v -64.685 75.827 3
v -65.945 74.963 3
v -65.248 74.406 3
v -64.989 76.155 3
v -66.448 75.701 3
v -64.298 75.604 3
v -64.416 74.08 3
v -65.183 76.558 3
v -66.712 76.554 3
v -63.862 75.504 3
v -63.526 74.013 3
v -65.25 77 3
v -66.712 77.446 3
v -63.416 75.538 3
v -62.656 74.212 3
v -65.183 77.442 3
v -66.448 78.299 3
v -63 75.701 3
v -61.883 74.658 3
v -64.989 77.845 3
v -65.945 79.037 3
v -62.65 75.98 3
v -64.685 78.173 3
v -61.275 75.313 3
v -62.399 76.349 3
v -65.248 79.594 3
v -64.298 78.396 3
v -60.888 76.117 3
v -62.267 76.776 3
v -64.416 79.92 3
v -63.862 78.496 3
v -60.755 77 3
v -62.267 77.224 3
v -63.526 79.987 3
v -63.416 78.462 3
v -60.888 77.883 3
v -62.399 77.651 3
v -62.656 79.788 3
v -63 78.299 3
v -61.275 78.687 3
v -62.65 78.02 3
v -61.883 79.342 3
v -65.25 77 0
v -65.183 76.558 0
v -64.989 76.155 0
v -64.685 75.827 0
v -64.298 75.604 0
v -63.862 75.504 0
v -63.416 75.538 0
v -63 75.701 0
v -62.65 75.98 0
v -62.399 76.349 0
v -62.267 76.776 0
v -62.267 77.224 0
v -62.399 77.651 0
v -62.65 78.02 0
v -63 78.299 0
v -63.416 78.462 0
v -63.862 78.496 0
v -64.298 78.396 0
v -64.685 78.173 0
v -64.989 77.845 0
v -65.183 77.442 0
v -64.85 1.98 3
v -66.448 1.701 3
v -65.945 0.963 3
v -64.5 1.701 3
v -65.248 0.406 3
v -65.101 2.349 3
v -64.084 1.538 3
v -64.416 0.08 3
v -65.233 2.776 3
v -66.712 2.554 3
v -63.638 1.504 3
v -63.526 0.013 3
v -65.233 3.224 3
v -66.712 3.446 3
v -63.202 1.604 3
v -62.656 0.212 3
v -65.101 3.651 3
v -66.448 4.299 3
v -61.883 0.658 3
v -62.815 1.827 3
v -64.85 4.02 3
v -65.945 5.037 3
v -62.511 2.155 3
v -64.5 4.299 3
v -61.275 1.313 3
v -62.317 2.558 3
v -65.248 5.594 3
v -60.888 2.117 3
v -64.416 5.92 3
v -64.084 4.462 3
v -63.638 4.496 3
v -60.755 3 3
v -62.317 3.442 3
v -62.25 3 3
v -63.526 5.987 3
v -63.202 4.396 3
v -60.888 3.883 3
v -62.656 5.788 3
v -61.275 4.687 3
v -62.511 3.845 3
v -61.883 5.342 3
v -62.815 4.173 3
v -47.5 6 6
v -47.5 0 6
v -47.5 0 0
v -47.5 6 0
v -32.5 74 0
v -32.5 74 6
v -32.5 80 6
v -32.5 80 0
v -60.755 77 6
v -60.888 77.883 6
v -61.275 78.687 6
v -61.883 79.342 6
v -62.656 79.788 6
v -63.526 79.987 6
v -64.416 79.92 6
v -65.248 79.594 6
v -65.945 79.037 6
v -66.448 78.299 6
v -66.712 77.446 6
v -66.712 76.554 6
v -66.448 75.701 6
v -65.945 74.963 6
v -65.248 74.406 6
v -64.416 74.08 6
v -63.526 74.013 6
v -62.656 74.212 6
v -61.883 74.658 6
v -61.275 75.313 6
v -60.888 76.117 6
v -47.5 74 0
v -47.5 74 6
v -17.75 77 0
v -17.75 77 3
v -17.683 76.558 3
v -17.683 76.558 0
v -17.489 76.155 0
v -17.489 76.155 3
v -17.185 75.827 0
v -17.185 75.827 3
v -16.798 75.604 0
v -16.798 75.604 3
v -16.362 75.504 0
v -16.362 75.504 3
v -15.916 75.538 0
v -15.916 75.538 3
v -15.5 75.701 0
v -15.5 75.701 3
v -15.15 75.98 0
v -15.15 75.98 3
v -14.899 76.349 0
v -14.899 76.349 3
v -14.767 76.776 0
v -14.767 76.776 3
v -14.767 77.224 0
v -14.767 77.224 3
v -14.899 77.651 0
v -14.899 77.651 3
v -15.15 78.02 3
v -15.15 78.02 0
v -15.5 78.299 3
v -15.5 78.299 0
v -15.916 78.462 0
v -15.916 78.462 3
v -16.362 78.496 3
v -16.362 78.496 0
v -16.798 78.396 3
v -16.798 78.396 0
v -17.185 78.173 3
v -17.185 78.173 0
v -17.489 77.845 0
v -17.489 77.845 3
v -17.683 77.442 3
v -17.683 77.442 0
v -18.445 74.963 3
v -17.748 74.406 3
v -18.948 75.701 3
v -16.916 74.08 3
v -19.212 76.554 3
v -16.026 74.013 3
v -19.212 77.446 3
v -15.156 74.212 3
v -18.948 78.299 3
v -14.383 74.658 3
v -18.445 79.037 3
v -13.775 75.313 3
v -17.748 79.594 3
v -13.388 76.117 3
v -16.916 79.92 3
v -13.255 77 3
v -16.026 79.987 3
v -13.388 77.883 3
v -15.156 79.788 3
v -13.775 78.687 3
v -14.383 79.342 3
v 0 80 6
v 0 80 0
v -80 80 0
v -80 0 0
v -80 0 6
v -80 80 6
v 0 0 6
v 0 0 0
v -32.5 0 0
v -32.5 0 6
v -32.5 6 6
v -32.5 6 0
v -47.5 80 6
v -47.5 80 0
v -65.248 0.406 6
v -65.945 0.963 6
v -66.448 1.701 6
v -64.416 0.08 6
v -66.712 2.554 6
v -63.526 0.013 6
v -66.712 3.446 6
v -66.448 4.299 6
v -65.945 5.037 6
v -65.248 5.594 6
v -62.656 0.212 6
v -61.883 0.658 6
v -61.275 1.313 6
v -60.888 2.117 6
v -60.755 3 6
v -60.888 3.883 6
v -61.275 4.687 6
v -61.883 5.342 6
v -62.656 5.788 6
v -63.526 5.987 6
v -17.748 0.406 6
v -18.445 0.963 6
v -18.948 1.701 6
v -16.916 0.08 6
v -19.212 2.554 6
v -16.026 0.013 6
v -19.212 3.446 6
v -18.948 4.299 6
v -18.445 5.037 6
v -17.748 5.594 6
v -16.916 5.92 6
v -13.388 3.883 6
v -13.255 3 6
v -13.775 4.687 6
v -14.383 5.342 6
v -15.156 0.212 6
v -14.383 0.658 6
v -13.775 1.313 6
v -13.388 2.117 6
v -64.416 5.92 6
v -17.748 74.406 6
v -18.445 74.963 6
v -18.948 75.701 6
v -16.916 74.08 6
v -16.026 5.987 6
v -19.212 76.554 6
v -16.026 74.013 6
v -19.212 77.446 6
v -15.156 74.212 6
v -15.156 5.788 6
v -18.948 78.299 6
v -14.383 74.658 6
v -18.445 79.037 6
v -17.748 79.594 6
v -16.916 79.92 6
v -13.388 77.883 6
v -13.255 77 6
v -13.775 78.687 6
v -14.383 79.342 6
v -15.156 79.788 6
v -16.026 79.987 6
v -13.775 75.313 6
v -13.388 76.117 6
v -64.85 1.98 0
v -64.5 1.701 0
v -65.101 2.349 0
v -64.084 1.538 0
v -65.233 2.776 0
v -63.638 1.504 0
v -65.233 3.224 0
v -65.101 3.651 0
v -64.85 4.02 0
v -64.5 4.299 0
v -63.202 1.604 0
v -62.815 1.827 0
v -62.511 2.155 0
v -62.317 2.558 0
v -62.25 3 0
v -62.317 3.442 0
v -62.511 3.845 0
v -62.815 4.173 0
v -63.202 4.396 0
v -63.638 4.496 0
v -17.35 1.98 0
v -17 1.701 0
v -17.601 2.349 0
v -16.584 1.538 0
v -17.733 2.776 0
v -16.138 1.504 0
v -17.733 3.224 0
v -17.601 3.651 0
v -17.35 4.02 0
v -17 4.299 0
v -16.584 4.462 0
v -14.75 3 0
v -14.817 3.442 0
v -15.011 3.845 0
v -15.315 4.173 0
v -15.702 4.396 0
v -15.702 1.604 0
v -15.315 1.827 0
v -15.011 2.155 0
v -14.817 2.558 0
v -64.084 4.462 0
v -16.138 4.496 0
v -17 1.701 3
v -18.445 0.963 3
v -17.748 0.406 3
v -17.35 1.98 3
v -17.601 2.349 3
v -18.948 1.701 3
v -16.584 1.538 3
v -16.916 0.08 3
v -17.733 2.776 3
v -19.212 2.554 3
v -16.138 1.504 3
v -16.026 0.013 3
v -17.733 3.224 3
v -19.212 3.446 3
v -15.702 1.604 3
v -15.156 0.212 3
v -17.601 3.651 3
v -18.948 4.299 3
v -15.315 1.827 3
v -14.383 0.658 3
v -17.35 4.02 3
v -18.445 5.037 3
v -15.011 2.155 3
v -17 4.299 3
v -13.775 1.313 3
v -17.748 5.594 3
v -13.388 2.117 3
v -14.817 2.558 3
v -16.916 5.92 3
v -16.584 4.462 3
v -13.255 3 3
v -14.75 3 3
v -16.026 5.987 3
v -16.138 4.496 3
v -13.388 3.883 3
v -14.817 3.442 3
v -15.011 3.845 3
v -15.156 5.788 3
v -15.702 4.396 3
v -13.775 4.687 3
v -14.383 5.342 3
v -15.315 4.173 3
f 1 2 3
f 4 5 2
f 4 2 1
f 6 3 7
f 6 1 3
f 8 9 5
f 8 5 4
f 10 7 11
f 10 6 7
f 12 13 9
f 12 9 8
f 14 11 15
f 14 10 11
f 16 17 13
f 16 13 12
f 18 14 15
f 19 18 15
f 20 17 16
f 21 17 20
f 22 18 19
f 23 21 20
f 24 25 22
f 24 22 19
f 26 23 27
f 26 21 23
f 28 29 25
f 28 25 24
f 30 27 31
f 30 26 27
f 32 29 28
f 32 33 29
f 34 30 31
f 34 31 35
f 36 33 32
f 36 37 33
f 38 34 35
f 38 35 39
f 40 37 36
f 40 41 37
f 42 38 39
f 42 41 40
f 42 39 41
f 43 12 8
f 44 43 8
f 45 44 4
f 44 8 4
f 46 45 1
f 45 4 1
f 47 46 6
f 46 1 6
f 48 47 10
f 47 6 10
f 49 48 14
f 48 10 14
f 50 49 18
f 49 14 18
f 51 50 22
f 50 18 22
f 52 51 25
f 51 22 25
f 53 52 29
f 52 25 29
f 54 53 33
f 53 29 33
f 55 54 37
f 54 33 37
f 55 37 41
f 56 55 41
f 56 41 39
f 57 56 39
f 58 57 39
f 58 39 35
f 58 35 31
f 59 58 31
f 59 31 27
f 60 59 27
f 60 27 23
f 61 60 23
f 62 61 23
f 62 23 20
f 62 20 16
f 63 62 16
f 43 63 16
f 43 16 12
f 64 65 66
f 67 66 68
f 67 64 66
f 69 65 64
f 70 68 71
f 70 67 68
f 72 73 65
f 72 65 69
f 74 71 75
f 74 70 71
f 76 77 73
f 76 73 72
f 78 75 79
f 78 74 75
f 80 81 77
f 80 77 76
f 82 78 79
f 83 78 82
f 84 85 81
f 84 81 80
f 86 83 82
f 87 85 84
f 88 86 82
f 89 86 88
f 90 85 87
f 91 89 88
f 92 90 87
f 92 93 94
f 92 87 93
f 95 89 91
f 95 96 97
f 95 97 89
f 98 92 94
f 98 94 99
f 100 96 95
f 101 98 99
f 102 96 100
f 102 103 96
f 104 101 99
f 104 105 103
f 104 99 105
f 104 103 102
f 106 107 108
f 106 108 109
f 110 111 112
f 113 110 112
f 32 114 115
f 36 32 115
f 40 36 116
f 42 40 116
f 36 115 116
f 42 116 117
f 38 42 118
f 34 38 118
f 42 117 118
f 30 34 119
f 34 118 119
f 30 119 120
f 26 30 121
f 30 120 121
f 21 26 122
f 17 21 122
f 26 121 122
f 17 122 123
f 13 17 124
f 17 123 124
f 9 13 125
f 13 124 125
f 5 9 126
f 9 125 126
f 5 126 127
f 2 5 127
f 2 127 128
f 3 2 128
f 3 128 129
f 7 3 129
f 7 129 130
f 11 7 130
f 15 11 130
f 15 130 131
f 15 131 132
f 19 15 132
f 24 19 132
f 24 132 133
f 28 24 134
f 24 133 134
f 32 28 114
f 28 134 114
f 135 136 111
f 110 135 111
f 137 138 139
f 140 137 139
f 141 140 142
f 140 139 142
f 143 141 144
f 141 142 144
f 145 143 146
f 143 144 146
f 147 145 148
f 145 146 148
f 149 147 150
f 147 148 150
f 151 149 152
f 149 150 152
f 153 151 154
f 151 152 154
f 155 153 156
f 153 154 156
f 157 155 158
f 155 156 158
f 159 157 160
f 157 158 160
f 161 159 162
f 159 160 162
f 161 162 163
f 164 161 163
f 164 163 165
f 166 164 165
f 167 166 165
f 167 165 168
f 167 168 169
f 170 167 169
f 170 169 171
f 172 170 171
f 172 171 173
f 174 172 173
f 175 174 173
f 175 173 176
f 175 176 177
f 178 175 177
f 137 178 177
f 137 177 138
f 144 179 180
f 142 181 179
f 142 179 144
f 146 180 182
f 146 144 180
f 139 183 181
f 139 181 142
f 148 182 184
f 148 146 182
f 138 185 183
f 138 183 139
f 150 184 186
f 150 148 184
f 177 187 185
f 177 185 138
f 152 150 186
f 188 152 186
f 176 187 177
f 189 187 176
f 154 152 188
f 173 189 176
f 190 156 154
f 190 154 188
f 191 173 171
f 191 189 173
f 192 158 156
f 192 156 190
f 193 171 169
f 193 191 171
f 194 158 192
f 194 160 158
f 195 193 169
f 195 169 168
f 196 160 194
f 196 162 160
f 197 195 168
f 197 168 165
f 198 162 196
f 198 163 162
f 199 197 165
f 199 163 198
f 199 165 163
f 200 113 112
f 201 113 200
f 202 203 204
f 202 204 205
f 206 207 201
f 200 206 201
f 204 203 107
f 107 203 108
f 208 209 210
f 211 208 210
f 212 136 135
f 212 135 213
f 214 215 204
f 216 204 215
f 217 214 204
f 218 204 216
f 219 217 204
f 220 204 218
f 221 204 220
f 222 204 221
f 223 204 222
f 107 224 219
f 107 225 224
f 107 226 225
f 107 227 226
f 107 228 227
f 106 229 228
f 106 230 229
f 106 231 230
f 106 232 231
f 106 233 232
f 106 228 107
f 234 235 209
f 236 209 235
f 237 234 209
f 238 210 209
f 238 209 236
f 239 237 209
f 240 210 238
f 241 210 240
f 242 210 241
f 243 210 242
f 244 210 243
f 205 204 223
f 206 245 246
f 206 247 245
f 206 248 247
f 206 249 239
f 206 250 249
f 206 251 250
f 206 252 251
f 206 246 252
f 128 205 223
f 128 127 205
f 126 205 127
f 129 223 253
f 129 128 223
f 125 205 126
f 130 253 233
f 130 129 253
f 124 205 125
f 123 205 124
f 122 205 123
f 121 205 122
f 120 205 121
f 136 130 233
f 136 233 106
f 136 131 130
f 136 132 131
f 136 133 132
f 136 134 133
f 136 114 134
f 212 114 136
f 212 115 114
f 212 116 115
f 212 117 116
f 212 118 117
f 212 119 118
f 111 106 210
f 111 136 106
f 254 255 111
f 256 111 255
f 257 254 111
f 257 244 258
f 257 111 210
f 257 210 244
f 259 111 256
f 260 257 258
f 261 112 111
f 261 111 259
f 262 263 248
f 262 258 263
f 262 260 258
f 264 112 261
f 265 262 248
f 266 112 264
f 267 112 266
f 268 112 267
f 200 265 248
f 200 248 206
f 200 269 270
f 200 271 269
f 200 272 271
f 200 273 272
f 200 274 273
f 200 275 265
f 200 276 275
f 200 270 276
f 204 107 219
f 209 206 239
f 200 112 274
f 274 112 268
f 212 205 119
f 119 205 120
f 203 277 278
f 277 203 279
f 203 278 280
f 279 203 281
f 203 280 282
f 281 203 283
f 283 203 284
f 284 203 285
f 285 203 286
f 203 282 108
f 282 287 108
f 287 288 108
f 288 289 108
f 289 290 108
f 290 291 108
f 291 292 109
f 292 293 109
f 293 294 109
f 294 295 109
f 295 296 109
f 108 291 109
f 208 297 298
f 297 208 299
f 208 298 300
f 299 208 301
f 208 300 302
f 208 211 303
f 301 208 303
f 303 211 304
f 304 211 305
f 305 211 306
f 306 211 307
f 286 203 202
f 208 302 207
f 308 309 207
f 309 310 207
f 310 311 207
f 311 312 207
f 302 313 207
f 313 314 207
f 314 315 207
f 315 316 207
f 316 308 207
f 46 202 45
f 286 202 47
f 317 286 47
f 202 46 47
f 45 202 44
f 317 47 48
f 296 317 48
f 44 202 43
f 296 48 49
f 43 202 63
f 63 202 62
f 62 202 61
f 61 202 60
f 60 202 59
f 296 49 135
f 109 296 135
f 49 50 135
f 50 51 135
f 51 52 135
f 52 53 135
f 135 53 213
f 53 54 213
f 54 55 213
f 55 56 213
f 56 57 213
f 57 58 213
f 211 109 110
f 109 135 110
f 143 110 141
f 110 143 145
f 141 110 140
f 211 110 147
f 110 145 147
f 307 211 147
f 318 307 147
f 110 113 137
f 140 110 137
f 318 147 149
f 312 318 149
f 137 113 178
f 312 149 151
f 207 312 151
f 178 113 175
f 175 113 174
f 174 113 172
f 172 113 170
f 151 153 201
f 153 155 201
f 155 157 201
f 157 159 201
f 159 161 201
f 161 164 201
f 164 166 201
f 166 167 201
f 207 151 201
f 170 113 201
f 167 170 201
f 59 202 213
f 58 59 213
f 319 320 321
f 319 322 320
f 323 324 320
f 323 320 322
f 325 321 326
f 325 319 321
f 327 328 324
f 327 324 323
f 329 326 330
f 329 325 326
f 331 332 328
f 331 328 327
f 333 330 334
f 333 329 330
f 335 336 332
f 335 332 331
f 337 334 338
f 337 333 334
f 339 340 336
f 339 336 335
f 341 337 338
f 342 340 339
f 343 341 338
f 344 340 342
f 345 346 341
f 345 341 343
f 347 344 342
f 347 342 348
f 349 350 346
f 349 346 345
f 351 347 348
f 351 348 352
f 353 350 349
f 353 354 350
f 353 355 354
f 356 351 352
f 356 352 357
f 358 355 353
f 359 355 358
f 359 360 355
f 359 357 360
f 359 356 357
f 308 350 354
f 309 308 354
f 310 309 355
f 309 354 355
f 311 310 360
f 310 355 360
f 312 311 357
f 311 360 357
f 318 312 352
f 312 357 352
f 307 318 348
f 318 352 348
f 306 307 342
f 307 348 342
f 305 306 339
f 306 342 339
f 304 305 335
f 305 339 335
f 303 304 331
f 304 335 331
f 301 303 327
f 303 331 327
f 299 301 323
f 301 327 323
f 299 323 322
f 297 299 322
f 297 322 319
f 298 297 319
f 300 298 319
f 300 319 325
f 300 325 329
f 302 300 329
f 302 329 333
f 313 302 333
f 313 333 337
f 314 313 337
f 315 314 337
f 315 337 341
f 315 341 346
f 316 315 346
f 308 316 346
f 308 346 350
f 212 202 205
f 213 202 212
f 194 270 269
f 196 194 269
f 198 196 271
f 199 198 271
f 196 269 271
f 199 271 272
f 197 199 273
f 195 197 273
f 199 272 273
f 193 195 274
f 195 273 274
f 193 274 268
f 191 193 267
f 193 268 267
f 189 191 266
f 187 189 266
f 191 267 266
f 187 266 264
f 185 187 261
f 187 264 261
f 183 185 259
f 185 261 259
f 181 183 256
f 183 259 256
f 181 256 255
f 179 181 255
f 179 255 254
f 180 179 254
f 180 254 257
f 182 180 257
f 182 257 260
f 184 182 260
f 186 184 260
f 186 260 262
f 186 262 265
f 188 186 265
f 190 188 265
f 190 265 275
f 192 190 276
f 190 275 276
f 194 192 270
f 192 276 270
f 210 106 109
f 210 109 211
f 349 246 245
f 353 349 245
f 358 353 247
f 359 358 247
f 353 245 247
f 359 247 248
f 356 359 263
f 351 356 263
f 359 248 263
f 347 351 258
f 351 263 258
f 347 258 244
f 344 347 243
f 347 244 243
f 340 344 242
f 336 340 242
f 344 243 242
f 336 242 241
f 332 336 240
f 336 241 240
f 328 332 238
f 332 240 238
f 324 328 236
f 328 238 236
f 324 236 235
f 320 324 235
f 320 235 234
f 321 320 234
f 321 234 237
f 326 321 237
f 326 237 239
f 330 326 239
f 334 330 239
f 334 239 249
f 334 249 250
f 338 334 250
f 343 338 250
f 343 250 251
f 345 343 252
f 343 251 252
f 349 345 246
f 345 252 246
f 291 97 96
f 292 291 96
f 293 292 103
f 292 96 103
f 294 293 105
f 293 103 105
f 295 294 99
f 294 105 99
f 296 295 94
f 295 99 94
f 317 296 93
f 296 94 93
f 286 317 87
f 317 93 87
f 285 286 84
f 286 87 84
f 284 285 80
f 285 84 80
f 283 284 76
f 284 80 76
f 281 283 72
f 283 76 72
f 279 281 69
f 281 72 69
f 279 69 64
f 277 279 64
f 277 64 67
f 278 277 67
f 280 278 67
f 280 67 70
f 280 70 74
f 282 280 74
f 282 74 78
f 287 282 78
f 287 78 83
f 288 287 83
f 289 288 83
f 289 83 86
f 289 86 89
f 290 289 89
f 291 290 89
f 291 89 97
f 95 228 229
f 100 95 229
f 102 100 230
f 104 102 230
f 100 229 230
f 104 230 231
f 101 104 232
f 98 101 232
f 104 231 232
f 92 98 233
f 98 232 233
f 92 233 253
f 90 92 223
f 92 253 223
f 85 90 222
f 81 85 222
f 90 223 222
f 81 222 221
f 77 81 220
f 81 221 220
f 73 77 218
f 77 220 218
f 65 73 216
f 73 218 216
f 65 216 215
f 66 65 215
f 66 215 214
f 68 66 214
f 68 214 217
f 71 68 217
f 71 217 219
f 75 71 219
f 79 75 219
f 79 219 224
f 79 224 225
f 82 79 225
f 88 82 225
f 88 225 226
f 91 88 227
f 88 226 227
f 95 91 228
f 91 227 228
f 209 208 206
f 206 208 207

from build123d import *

# Parameters (mm, degrees)
ESQUISSE1_W             = 80
ESQUISSE1_H             = 80
BOSS_EXTRU_1_DEPTH      = 6
ESQUISSE2_R             = 1.5
ESQUISSE2_W             = 15
ESQUISSE2_H             = 6
ENL_V_MAT_EXTRU_1_DEPTH = 6
ESQUISSE3_R             = 2.995
ENL_V_MAT_EXTRU_2_DEPTH = 3


with BuildPart() as part:
    # Esquisse1 → Boss.-Extru.1 (new body)
    with BuildSketch(Plane.XY):
        with Locations((-40, 40)):
            Rectangle(ESQUISSE1_W, ESQUISSE1_H)
    extrude(amount=BOSS_EXTRU_1_DEPTH)

    # Esquisse2 → Enlèv. mat.-Extru.1 (cut)
    with BuildSketch(Plane.XY.offset(6)):
        with Locations((-16.25, 3)):
            Circle(ESQUISSE2_R)
        with Locations(Location((-63.75, 77, 0), (0, 0, 180))):
            Circle(ESQUISSE2_R)
        with Locations(Location((-16.25, 77, 0), (0, 0, 180))):
            Circle(ESQUISSE2_R)
        with Locations((-63.75, 3)):
            Circle(ESQUISSE2_R)
        with Locations((-40, 3)):
            Rectangle(ESQUISSE2_W, ESQUISSE2_H)
        with Locations((-40, 77)):
            Rectangle(ESQUISSE2_W, ESQUISSE2_H)
    extrude(amount=-ENL_V_MAT_EXTRU_1_DEPTH, mode=Mode.SUBTRACT)

    # Esquisse3 → Enlèv. mat.-Extru.2 (cut)
    with BuildSketch(Plane.XY.offset(6)):
        with Locations((-16.25, 3)):
            Circle(ESQUISSE3_R)
        with Locations((-63.75, 3)):
            Circle(ESQUISSE3_R)
        with Locations((-16.25, 77)):
            Circle(ESQUISSE3_R)
        with Locations((-63.75, 77)):
            Circle(ESQUISSE3_R)
    extrude(amount=-ENL_V_MAT_EXTRU_2_DEPTH, mode=Mode.SUBTRACT)


solid = part.part
